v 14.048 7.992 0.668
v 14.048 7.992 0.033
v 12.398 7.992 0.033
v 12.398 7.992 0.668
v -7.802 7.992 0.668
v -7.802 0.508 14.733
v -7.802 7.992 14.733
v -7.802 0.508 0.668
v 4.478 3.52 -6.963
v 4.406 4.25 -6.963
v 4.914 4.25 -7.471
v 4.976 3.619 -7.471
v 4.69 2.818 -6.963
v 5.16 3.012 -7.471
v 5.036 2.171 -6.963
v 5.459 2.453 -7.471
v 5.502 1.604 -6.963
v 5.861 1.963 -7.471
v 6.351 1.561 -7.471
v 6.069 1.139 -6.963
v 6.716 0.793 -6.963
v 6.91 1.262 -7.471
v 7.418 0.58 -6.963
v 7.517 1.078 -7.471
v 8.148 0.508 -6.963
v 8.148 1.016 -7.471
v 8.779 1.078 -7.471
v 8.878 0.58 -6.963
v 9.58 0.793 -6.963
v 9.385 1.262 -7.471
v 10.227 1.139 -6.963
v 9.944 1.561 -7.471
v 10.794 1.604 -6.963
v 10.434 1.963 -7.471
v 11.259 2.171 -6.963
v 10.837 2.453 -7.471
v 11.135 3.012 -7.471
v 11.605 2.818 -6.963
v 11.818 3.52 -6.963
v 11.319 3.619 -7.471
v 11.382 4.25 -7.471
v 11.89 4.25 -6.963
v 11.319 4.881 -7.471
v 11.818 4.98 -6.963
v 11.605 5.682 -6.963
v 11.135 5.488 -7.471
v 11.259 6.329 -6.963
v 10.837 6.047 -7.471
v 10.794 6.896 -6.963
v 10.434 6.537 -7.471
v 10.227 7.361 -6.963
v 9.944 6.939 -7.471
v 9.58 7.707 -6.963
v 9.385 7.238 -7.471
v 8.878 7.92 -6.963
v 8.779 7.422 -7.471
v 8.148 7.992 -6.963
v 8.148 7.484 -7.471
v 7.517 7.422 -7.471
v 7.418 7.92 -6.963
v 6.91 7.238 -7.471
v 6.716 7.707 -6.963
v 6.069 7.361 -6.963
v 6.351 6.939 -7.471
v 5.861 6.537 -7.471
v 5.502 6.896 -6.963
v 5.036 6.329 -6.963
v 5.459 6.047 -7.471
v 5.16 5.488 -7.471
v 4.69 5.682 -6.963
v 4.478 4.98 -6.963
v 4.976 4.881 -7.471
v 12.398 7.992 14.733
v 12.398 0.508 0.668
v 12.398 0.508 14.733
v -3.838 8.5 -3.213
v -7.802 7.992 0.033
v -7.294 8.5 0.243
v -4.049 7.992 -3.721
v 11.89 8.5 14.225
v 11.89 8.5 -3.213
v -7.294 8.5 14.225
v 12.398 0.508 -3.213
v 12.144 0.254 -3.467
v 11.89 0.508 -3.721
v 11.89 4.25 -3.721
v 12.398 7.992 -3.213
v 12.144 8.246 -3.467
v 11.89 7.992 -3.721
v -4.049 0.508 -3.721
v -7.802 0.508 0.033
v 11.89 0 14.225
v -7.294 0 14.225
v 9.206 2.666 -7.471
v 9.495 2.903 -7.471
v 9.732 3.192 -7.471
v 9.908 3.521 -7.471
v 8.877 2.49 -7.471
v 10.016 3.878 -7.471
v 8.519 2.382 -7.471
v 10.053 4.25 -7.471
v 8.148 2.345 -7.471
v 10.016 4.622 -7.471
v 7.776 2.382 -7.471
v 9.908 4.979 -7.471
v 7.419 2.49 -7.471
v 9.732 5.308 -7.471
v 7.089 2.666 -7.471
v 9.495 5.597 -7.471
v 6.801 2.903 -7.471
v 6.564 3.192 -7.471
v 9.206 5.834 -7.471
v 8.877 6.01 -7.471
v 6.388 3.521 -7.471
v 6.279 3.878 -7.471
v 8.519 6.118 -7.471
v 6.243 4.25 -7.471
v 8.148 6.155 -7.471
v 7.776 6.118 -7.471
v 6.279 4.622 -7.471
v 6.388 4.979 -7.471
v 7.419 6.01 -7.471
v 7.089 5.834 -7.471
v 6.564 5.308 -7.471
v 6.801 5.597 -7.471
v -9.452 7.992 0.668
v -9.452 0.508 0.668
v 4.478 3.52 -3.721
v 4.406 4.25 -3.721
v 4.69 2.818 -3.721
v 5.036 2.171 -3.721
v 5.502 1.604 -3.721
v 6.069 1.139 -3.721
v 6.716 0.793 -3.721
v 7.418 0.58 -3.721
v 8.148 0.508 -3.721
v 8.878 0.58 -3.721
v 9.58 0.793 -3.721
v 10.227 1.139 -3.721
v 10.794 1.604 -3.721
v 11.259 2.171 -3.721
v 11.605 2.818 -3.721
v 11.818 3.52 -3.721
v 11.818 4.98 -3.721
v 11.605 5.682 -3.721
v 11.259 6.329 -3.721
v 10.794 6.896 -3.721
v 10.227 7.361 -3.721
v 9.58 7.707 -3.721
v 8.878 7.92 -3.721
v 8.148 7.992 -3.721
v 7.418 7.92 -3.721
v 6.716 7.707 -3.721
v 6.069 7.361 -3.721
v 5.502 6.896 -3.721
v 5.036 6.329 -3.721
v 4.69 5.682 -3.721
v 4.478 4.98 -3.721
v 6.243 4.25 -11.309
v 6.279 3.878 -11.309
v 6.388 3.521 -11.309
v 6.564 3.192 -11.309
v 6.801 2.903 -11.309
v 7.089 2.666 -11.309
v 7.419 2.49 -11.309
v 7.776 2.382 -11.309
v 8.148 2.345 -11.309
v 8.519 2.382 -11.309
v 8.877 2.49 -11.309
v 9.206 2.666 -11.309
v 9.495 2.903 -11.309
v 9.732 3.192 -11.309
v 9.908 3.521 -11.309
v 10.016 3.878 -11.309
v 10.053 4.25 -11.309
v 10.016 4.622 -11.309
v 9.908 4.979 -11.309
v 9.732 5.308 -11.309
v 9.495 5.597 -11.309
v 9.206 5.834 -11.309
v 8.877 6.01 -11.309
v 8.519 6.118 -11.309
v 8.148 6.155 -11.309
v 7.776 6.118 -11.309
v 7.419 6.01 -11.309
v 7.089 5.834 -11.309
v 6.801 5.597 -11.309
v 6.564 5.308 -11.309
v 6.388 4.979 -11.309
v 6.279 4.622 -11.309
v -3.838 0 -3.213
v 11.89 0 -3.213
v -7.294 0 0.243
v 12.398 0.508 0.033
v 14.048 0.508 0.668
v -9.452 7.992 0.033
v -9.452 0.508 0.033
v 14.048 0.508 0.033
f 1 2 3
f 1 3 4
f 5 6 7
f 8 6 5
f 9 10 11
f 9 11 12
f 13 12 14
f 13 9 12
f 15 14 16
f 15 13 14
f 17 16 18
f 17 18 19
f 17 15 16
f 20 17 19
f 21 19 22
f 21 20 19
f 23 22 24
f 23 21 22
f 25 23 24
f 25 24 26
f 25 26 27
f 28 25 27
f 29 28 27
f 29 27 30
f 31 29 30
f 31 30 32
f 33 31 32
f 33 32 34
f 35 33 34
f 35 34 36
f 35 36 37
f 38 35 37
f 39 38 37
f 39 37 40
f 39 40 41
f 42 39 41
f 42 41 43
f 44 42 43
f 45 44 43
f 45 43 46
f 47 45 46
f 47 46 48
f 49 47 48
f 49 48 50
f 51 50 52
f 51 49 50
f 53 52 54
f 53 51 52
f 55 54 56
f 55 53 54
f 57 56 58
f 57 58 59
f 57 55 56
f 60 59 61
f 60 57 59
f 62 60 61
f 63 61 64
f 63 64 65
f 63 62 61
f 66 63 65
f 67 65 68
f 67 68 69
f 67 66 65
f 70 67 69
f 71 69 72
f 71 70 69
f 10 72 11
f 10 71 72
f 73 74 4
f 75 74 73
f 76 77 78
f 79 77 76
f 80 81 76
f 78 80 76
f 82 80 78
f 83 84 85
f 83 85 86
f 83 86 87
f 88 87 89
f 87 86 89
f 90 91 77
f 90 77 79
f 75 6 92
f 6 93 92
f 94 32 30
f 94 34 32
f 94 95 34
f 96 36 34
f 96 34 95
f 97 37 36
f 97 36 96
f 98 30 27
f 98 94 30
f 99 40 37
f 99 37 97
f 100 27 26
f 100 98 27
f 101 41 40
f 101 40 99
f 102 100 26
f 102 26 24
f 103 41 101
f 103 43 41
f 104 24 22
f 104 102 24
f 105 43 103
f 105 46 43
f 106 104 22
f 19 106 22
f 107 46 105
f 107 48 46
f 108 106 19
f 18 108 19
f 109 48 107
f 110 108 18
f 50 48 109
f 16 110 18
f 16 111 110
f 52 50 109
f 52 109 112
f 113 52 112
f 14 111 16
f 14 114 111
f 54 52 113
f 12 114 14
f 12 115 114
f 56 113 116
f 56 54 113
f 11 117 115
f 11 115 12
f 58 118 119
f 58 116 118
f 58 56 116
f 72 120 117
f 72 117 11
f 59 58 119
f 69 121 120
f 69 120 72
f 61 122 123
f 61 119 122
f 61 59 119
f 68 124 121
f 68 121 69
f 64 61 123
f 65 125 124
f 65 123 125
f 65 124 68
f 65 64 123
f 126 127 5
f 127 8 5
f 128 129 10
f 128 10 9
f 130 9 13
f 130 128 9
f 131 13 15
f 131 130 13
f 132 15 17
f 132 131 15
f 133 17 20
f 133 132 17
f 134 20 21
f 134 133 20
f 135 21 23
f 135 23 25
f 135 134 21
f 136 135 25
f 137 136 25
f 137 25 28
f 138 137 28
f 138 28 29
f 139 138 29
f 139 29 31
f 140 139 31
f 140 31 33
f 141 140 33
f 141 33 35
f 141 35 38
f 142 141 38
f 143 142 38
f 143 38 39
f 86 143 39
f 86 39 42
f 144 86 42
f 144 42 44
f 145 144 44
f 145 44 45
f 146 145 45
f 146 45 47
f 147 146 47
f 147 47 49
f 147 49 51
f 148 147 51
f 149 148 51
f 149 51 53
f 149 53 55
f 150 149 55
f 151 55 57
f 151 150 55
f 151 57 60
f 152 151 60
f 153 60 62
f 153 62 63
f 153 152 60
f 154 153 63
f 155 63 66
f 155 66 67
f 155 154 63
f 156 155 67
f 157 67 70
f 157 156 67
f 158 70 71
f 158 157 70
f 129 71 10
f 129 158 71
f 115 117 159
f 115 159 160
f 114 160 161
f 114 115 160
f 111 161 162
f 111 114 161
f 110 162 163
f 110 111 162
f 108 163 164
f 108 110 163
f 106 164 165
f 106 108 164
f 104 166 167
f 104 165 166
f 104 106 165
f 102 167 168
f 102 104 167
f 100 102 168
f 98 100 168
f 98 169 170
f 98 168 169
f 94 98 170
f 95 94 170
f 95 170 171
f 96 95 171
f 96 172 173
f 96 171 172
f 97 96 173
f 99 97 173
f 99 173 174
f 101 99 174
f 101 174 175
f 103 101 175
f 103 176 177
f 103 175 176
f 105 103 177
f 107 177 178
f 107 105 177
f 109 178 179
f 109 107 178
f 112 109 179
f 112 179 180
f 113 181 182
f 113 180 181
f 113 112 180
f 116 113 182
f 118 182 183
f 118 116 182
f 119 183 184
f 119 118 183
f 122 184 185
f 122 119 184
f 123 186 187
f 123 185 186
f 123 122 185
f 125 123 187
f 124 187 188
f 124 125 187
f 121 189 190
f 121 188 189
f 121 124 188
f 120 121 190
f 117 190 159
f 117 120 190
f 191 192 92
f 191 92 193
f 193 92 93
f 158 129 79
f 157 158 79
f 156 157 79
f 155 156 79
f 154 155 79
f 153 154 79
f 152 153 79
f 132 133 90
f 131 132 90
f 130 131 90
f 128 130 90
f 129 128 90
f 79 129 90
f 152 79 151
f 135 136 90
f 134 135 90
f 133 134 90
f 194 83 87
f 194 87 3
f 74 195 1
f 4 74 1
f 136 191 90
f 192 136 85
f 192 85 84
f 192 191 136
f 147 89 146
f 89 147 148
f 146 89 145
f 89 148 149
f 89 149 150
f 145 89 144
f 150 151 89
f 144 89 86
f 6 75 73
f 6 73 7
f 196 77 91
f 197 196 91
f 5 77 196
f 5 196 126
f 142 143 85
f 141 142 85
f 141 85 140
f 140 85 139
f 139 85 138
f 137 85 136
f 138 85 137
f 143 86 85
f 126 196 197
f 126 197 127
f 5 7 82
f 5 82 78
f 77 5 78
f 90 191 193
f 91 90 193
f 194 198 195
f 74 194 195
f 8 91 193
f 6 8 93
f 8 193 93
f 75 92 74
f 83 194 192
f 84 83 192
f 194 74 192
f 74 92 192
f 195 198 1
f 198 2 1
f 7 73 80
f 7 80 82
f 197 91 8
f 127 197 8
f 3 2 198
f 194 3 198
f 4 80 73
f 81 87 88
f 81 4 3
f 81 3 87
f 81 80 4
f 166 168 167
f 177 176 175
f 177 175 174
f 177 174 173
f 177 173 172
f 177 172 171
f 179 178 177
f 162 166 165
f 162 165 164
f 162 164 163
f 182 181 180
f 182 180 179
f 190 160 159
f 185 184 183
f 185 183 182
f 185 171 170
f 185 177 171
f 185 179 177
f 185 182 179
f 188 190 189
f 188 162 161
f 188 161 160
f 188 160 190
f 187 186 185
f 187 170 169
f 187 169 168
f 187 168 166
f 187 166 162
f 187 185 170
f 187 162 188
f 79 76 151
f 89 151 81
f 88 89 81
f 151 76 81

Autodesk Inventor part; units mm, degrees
ref_plane "YZ Plane" through (0, 0, 0) normal (1, 0, 0) x (0, 1, 0)
ref_plane "XZ Plane" through (0, 0, 0) normal (0, 1, 0) x (-1, 0, 0)
ref_plane "XY Plane" through (0, 0, 0) normal (0, 0, 1) x (1, 0, 0)
sketch "Sketch1" plane through (0, 0, 0) normal (0, 1, 0) x (-1, 0, 0)
  line L0 (7.8024, -7.4673) -> (-12.3976, -7.4673)
  line L1 (-12.3976, -7.4673) -> (-12.3976, 14.7327)
  line L2 (-12.3976, 14.7327) -> (7.8024, 14.7327)
  line L3 (7.8024, 14.7327) -> (7.8024, -7.4673)
  line L4 (-12.3976, 0.0327) -> (7.8024, 0.0327)
  line L5 (-12.3976, -3.7208) -> (4.0489, -3.7208)
  line L6 (7.8024, 0.0327) -> (4.0489, -3.7208)
  point P0 (0, 0)
  dimension "d0" = 20.2
  dimension "d1" = 22.2
  dimension "d2" = 14.7
  dimension "d3" = 7.5
  dimension "d4" = 3.7465
  dimension "d5" = 45
extrude "Extrusion1" add sketch "Sketch1" along normal blind 8.5 contours L4 L1 L2 L3 | L6 L5 L1 L4
chamfer "Chamfer1" distance 0.508 angle 45 1 edges at (12.3976, 8.5, 5.506)
chamfer "Chamfer2" distance 0.508 angle 45 1 edges at (3.9204, 8.5, -3.7208)
chamfer "Chamfer3" distance 0.508 angle 45 1 edges at (-7.8024, 8.5, 7.3827)
chamfer "Chamfer4" distance 0.508 angle 45 1 edges at (-5.9256, 8.5, -1.844)
chamfer "Chamfer5" distance 0.508 angle 45 1 edges at (2.2976, 8.5, 14.7327)
chamfer "Chamfer6" distance 0.508 angle 45 5 edges at (-5.9256, 0, -1.844) (-7.8024, 0, 7.3827) (2.2976, 0, 14.7327) (12.3976, 0, 5.506) (4.1744, 0, -3.7208)
sketch "Sketch2" plane through (-7.8024, 7.992, 0.0327) normal (-1, 0, 0) x (0, 0, 1)
  line L0 (0, 0) -> (14.7, 0) projected
  line L1 (0, -7.484) -> (0.635, -7.484)
  line L2 (0.635, -7.484) -> (0.635, 0)
  line L3 (0.635, 0) -> (0, 0)
  line L4 (0, 0) -> (0, -7.484)
  point P0 (-0.0327, -7.992)
  point P1 (14.7, 0)
  point P2 (1.5266, 1.0795)
  point P3 (13.6205, 0)
  dimension "d26" = 0.635
extrude "Extrusion2" add sketch "Sketch2" along normal blind 1.65 and the other way blind 21.85
chamfer "Chamfer7" distance 0.508 angle 45 1 edges at (12.3976, 4.25, -3.7208)
sketch "Sketch4" plane through (-4.0489, 0.508, -3.7208) normal (0, 0, -1) x (-1, 0, 0)
  line L0 (-15.9385, 0) -> (-15.9385, 7.484) projected
  line L1 (0, 0) -> (-15.9385, 0) projected
  line L2 (0, 0) -> (0, 7.484) projected
  line L3 (-15.9385, 7.484) -> (0, 7.484) projected
  line L4 (0, 0) -> (-15.9385, 0) projected
  circle A0 centre (-12.1965, 3.742) radius 3.742
  point P0 (-4.0489, -0.508)
extrude "Extrusion3" add sketch "Sketch4" along normal blind 3.75 contours A0
chamfer "Chamfer8" distance 0.508 angle 45 1 edges at (11.8896, 4.25, -7.4708)
sketch "Sketch5" plane through (8.1476, 4.25, -7.4708) normal (0, 0, -1) x (-1, 0, 0)
  circle A0 centre (0, 0) radius 3.234 projected
  circle A1 centre (0, 0) radius 1.905
  point P0 (8.1476, -4.25)
  dimension "d39" = 3.81
extrude "Extrusion4" add sketch "Sketch5" along normal blind 3.8382 contours A1
sketch "Sketch6" plane through (-4.0489, 0.508, -3.7208) normal (0, 0, -1) x (-1, 0, 0)
  circle A0 centre (-12.1965, 3.742) radius 1.905 projected
  point P0 (-4.0489, -0.508)
sketch "Sketch7" plane through (-4.0489, 0.508, -3.7208) normal (0, 0, -1) x (-1, 0, 0)
  arc A0 (-12.1965, 0) -> (-12.1965, 7.484) centre (-12.1965, 3.742) ccw projected
  line L0 (0, 0) -> (-12.1965, 0) projected
  line L1 (0, 0) -> (0, 7.484) projected
  line L2 (-12.1965, 7.484) -> (0, 7.484) projected
  circle A1 centre (-12.1965, 3.742) radius 1.905 projected
  circle A2 centre (-12.1965, 3.742) radius 1.905 projected
  circle A3 centre (-12.1965, 3.742) radius 3.234 projected
  circle A4 centre (-12.1965, 3.742) radius 3.234 projected
  arc A5 (-12.1965, 7.484) -> (-15.9385, 3.742) centre (-12.1965, 3.742) ccw projected
  line L3 (-15.9385, 7.484) -> (-12.1965, 7.484) projected
  line L4 (-15.9385, 3.742) -> (-15.9385, 7.484) projected
  line L5 (-15.9385, 3.742) -> (-15.9385, 7.484) projected
  line L6 (-16.4465, 7.484) -> (-16.4465, 0) projected
  arc A6 (-15.9385, 3.742) -> (-12.1965, 0) centre (-12.1965, 3.742) ccw projected
  line L7 (-15.9385, 0) -> (-15.9385, 3.742) projected
  line L8 (-12.1965, 0) -> (-15.9385, 0) projected
  line L9 (-16.4465, 7.484) -> (-16.4465, 0) projected
  line L10 (-18.0965, 7.484) -> (-16.4465, 7.484) projected
  line L11 (-18.0965, 0) -> (-18.0965, 7.484) projected
  line L12 (-16.4465, 0) -> (-18.0965, 0) projected
  point P0 (-4.0489, -0.508)
  dimension "d42" = 5.9
properties part number "HD1440A_Servo"
